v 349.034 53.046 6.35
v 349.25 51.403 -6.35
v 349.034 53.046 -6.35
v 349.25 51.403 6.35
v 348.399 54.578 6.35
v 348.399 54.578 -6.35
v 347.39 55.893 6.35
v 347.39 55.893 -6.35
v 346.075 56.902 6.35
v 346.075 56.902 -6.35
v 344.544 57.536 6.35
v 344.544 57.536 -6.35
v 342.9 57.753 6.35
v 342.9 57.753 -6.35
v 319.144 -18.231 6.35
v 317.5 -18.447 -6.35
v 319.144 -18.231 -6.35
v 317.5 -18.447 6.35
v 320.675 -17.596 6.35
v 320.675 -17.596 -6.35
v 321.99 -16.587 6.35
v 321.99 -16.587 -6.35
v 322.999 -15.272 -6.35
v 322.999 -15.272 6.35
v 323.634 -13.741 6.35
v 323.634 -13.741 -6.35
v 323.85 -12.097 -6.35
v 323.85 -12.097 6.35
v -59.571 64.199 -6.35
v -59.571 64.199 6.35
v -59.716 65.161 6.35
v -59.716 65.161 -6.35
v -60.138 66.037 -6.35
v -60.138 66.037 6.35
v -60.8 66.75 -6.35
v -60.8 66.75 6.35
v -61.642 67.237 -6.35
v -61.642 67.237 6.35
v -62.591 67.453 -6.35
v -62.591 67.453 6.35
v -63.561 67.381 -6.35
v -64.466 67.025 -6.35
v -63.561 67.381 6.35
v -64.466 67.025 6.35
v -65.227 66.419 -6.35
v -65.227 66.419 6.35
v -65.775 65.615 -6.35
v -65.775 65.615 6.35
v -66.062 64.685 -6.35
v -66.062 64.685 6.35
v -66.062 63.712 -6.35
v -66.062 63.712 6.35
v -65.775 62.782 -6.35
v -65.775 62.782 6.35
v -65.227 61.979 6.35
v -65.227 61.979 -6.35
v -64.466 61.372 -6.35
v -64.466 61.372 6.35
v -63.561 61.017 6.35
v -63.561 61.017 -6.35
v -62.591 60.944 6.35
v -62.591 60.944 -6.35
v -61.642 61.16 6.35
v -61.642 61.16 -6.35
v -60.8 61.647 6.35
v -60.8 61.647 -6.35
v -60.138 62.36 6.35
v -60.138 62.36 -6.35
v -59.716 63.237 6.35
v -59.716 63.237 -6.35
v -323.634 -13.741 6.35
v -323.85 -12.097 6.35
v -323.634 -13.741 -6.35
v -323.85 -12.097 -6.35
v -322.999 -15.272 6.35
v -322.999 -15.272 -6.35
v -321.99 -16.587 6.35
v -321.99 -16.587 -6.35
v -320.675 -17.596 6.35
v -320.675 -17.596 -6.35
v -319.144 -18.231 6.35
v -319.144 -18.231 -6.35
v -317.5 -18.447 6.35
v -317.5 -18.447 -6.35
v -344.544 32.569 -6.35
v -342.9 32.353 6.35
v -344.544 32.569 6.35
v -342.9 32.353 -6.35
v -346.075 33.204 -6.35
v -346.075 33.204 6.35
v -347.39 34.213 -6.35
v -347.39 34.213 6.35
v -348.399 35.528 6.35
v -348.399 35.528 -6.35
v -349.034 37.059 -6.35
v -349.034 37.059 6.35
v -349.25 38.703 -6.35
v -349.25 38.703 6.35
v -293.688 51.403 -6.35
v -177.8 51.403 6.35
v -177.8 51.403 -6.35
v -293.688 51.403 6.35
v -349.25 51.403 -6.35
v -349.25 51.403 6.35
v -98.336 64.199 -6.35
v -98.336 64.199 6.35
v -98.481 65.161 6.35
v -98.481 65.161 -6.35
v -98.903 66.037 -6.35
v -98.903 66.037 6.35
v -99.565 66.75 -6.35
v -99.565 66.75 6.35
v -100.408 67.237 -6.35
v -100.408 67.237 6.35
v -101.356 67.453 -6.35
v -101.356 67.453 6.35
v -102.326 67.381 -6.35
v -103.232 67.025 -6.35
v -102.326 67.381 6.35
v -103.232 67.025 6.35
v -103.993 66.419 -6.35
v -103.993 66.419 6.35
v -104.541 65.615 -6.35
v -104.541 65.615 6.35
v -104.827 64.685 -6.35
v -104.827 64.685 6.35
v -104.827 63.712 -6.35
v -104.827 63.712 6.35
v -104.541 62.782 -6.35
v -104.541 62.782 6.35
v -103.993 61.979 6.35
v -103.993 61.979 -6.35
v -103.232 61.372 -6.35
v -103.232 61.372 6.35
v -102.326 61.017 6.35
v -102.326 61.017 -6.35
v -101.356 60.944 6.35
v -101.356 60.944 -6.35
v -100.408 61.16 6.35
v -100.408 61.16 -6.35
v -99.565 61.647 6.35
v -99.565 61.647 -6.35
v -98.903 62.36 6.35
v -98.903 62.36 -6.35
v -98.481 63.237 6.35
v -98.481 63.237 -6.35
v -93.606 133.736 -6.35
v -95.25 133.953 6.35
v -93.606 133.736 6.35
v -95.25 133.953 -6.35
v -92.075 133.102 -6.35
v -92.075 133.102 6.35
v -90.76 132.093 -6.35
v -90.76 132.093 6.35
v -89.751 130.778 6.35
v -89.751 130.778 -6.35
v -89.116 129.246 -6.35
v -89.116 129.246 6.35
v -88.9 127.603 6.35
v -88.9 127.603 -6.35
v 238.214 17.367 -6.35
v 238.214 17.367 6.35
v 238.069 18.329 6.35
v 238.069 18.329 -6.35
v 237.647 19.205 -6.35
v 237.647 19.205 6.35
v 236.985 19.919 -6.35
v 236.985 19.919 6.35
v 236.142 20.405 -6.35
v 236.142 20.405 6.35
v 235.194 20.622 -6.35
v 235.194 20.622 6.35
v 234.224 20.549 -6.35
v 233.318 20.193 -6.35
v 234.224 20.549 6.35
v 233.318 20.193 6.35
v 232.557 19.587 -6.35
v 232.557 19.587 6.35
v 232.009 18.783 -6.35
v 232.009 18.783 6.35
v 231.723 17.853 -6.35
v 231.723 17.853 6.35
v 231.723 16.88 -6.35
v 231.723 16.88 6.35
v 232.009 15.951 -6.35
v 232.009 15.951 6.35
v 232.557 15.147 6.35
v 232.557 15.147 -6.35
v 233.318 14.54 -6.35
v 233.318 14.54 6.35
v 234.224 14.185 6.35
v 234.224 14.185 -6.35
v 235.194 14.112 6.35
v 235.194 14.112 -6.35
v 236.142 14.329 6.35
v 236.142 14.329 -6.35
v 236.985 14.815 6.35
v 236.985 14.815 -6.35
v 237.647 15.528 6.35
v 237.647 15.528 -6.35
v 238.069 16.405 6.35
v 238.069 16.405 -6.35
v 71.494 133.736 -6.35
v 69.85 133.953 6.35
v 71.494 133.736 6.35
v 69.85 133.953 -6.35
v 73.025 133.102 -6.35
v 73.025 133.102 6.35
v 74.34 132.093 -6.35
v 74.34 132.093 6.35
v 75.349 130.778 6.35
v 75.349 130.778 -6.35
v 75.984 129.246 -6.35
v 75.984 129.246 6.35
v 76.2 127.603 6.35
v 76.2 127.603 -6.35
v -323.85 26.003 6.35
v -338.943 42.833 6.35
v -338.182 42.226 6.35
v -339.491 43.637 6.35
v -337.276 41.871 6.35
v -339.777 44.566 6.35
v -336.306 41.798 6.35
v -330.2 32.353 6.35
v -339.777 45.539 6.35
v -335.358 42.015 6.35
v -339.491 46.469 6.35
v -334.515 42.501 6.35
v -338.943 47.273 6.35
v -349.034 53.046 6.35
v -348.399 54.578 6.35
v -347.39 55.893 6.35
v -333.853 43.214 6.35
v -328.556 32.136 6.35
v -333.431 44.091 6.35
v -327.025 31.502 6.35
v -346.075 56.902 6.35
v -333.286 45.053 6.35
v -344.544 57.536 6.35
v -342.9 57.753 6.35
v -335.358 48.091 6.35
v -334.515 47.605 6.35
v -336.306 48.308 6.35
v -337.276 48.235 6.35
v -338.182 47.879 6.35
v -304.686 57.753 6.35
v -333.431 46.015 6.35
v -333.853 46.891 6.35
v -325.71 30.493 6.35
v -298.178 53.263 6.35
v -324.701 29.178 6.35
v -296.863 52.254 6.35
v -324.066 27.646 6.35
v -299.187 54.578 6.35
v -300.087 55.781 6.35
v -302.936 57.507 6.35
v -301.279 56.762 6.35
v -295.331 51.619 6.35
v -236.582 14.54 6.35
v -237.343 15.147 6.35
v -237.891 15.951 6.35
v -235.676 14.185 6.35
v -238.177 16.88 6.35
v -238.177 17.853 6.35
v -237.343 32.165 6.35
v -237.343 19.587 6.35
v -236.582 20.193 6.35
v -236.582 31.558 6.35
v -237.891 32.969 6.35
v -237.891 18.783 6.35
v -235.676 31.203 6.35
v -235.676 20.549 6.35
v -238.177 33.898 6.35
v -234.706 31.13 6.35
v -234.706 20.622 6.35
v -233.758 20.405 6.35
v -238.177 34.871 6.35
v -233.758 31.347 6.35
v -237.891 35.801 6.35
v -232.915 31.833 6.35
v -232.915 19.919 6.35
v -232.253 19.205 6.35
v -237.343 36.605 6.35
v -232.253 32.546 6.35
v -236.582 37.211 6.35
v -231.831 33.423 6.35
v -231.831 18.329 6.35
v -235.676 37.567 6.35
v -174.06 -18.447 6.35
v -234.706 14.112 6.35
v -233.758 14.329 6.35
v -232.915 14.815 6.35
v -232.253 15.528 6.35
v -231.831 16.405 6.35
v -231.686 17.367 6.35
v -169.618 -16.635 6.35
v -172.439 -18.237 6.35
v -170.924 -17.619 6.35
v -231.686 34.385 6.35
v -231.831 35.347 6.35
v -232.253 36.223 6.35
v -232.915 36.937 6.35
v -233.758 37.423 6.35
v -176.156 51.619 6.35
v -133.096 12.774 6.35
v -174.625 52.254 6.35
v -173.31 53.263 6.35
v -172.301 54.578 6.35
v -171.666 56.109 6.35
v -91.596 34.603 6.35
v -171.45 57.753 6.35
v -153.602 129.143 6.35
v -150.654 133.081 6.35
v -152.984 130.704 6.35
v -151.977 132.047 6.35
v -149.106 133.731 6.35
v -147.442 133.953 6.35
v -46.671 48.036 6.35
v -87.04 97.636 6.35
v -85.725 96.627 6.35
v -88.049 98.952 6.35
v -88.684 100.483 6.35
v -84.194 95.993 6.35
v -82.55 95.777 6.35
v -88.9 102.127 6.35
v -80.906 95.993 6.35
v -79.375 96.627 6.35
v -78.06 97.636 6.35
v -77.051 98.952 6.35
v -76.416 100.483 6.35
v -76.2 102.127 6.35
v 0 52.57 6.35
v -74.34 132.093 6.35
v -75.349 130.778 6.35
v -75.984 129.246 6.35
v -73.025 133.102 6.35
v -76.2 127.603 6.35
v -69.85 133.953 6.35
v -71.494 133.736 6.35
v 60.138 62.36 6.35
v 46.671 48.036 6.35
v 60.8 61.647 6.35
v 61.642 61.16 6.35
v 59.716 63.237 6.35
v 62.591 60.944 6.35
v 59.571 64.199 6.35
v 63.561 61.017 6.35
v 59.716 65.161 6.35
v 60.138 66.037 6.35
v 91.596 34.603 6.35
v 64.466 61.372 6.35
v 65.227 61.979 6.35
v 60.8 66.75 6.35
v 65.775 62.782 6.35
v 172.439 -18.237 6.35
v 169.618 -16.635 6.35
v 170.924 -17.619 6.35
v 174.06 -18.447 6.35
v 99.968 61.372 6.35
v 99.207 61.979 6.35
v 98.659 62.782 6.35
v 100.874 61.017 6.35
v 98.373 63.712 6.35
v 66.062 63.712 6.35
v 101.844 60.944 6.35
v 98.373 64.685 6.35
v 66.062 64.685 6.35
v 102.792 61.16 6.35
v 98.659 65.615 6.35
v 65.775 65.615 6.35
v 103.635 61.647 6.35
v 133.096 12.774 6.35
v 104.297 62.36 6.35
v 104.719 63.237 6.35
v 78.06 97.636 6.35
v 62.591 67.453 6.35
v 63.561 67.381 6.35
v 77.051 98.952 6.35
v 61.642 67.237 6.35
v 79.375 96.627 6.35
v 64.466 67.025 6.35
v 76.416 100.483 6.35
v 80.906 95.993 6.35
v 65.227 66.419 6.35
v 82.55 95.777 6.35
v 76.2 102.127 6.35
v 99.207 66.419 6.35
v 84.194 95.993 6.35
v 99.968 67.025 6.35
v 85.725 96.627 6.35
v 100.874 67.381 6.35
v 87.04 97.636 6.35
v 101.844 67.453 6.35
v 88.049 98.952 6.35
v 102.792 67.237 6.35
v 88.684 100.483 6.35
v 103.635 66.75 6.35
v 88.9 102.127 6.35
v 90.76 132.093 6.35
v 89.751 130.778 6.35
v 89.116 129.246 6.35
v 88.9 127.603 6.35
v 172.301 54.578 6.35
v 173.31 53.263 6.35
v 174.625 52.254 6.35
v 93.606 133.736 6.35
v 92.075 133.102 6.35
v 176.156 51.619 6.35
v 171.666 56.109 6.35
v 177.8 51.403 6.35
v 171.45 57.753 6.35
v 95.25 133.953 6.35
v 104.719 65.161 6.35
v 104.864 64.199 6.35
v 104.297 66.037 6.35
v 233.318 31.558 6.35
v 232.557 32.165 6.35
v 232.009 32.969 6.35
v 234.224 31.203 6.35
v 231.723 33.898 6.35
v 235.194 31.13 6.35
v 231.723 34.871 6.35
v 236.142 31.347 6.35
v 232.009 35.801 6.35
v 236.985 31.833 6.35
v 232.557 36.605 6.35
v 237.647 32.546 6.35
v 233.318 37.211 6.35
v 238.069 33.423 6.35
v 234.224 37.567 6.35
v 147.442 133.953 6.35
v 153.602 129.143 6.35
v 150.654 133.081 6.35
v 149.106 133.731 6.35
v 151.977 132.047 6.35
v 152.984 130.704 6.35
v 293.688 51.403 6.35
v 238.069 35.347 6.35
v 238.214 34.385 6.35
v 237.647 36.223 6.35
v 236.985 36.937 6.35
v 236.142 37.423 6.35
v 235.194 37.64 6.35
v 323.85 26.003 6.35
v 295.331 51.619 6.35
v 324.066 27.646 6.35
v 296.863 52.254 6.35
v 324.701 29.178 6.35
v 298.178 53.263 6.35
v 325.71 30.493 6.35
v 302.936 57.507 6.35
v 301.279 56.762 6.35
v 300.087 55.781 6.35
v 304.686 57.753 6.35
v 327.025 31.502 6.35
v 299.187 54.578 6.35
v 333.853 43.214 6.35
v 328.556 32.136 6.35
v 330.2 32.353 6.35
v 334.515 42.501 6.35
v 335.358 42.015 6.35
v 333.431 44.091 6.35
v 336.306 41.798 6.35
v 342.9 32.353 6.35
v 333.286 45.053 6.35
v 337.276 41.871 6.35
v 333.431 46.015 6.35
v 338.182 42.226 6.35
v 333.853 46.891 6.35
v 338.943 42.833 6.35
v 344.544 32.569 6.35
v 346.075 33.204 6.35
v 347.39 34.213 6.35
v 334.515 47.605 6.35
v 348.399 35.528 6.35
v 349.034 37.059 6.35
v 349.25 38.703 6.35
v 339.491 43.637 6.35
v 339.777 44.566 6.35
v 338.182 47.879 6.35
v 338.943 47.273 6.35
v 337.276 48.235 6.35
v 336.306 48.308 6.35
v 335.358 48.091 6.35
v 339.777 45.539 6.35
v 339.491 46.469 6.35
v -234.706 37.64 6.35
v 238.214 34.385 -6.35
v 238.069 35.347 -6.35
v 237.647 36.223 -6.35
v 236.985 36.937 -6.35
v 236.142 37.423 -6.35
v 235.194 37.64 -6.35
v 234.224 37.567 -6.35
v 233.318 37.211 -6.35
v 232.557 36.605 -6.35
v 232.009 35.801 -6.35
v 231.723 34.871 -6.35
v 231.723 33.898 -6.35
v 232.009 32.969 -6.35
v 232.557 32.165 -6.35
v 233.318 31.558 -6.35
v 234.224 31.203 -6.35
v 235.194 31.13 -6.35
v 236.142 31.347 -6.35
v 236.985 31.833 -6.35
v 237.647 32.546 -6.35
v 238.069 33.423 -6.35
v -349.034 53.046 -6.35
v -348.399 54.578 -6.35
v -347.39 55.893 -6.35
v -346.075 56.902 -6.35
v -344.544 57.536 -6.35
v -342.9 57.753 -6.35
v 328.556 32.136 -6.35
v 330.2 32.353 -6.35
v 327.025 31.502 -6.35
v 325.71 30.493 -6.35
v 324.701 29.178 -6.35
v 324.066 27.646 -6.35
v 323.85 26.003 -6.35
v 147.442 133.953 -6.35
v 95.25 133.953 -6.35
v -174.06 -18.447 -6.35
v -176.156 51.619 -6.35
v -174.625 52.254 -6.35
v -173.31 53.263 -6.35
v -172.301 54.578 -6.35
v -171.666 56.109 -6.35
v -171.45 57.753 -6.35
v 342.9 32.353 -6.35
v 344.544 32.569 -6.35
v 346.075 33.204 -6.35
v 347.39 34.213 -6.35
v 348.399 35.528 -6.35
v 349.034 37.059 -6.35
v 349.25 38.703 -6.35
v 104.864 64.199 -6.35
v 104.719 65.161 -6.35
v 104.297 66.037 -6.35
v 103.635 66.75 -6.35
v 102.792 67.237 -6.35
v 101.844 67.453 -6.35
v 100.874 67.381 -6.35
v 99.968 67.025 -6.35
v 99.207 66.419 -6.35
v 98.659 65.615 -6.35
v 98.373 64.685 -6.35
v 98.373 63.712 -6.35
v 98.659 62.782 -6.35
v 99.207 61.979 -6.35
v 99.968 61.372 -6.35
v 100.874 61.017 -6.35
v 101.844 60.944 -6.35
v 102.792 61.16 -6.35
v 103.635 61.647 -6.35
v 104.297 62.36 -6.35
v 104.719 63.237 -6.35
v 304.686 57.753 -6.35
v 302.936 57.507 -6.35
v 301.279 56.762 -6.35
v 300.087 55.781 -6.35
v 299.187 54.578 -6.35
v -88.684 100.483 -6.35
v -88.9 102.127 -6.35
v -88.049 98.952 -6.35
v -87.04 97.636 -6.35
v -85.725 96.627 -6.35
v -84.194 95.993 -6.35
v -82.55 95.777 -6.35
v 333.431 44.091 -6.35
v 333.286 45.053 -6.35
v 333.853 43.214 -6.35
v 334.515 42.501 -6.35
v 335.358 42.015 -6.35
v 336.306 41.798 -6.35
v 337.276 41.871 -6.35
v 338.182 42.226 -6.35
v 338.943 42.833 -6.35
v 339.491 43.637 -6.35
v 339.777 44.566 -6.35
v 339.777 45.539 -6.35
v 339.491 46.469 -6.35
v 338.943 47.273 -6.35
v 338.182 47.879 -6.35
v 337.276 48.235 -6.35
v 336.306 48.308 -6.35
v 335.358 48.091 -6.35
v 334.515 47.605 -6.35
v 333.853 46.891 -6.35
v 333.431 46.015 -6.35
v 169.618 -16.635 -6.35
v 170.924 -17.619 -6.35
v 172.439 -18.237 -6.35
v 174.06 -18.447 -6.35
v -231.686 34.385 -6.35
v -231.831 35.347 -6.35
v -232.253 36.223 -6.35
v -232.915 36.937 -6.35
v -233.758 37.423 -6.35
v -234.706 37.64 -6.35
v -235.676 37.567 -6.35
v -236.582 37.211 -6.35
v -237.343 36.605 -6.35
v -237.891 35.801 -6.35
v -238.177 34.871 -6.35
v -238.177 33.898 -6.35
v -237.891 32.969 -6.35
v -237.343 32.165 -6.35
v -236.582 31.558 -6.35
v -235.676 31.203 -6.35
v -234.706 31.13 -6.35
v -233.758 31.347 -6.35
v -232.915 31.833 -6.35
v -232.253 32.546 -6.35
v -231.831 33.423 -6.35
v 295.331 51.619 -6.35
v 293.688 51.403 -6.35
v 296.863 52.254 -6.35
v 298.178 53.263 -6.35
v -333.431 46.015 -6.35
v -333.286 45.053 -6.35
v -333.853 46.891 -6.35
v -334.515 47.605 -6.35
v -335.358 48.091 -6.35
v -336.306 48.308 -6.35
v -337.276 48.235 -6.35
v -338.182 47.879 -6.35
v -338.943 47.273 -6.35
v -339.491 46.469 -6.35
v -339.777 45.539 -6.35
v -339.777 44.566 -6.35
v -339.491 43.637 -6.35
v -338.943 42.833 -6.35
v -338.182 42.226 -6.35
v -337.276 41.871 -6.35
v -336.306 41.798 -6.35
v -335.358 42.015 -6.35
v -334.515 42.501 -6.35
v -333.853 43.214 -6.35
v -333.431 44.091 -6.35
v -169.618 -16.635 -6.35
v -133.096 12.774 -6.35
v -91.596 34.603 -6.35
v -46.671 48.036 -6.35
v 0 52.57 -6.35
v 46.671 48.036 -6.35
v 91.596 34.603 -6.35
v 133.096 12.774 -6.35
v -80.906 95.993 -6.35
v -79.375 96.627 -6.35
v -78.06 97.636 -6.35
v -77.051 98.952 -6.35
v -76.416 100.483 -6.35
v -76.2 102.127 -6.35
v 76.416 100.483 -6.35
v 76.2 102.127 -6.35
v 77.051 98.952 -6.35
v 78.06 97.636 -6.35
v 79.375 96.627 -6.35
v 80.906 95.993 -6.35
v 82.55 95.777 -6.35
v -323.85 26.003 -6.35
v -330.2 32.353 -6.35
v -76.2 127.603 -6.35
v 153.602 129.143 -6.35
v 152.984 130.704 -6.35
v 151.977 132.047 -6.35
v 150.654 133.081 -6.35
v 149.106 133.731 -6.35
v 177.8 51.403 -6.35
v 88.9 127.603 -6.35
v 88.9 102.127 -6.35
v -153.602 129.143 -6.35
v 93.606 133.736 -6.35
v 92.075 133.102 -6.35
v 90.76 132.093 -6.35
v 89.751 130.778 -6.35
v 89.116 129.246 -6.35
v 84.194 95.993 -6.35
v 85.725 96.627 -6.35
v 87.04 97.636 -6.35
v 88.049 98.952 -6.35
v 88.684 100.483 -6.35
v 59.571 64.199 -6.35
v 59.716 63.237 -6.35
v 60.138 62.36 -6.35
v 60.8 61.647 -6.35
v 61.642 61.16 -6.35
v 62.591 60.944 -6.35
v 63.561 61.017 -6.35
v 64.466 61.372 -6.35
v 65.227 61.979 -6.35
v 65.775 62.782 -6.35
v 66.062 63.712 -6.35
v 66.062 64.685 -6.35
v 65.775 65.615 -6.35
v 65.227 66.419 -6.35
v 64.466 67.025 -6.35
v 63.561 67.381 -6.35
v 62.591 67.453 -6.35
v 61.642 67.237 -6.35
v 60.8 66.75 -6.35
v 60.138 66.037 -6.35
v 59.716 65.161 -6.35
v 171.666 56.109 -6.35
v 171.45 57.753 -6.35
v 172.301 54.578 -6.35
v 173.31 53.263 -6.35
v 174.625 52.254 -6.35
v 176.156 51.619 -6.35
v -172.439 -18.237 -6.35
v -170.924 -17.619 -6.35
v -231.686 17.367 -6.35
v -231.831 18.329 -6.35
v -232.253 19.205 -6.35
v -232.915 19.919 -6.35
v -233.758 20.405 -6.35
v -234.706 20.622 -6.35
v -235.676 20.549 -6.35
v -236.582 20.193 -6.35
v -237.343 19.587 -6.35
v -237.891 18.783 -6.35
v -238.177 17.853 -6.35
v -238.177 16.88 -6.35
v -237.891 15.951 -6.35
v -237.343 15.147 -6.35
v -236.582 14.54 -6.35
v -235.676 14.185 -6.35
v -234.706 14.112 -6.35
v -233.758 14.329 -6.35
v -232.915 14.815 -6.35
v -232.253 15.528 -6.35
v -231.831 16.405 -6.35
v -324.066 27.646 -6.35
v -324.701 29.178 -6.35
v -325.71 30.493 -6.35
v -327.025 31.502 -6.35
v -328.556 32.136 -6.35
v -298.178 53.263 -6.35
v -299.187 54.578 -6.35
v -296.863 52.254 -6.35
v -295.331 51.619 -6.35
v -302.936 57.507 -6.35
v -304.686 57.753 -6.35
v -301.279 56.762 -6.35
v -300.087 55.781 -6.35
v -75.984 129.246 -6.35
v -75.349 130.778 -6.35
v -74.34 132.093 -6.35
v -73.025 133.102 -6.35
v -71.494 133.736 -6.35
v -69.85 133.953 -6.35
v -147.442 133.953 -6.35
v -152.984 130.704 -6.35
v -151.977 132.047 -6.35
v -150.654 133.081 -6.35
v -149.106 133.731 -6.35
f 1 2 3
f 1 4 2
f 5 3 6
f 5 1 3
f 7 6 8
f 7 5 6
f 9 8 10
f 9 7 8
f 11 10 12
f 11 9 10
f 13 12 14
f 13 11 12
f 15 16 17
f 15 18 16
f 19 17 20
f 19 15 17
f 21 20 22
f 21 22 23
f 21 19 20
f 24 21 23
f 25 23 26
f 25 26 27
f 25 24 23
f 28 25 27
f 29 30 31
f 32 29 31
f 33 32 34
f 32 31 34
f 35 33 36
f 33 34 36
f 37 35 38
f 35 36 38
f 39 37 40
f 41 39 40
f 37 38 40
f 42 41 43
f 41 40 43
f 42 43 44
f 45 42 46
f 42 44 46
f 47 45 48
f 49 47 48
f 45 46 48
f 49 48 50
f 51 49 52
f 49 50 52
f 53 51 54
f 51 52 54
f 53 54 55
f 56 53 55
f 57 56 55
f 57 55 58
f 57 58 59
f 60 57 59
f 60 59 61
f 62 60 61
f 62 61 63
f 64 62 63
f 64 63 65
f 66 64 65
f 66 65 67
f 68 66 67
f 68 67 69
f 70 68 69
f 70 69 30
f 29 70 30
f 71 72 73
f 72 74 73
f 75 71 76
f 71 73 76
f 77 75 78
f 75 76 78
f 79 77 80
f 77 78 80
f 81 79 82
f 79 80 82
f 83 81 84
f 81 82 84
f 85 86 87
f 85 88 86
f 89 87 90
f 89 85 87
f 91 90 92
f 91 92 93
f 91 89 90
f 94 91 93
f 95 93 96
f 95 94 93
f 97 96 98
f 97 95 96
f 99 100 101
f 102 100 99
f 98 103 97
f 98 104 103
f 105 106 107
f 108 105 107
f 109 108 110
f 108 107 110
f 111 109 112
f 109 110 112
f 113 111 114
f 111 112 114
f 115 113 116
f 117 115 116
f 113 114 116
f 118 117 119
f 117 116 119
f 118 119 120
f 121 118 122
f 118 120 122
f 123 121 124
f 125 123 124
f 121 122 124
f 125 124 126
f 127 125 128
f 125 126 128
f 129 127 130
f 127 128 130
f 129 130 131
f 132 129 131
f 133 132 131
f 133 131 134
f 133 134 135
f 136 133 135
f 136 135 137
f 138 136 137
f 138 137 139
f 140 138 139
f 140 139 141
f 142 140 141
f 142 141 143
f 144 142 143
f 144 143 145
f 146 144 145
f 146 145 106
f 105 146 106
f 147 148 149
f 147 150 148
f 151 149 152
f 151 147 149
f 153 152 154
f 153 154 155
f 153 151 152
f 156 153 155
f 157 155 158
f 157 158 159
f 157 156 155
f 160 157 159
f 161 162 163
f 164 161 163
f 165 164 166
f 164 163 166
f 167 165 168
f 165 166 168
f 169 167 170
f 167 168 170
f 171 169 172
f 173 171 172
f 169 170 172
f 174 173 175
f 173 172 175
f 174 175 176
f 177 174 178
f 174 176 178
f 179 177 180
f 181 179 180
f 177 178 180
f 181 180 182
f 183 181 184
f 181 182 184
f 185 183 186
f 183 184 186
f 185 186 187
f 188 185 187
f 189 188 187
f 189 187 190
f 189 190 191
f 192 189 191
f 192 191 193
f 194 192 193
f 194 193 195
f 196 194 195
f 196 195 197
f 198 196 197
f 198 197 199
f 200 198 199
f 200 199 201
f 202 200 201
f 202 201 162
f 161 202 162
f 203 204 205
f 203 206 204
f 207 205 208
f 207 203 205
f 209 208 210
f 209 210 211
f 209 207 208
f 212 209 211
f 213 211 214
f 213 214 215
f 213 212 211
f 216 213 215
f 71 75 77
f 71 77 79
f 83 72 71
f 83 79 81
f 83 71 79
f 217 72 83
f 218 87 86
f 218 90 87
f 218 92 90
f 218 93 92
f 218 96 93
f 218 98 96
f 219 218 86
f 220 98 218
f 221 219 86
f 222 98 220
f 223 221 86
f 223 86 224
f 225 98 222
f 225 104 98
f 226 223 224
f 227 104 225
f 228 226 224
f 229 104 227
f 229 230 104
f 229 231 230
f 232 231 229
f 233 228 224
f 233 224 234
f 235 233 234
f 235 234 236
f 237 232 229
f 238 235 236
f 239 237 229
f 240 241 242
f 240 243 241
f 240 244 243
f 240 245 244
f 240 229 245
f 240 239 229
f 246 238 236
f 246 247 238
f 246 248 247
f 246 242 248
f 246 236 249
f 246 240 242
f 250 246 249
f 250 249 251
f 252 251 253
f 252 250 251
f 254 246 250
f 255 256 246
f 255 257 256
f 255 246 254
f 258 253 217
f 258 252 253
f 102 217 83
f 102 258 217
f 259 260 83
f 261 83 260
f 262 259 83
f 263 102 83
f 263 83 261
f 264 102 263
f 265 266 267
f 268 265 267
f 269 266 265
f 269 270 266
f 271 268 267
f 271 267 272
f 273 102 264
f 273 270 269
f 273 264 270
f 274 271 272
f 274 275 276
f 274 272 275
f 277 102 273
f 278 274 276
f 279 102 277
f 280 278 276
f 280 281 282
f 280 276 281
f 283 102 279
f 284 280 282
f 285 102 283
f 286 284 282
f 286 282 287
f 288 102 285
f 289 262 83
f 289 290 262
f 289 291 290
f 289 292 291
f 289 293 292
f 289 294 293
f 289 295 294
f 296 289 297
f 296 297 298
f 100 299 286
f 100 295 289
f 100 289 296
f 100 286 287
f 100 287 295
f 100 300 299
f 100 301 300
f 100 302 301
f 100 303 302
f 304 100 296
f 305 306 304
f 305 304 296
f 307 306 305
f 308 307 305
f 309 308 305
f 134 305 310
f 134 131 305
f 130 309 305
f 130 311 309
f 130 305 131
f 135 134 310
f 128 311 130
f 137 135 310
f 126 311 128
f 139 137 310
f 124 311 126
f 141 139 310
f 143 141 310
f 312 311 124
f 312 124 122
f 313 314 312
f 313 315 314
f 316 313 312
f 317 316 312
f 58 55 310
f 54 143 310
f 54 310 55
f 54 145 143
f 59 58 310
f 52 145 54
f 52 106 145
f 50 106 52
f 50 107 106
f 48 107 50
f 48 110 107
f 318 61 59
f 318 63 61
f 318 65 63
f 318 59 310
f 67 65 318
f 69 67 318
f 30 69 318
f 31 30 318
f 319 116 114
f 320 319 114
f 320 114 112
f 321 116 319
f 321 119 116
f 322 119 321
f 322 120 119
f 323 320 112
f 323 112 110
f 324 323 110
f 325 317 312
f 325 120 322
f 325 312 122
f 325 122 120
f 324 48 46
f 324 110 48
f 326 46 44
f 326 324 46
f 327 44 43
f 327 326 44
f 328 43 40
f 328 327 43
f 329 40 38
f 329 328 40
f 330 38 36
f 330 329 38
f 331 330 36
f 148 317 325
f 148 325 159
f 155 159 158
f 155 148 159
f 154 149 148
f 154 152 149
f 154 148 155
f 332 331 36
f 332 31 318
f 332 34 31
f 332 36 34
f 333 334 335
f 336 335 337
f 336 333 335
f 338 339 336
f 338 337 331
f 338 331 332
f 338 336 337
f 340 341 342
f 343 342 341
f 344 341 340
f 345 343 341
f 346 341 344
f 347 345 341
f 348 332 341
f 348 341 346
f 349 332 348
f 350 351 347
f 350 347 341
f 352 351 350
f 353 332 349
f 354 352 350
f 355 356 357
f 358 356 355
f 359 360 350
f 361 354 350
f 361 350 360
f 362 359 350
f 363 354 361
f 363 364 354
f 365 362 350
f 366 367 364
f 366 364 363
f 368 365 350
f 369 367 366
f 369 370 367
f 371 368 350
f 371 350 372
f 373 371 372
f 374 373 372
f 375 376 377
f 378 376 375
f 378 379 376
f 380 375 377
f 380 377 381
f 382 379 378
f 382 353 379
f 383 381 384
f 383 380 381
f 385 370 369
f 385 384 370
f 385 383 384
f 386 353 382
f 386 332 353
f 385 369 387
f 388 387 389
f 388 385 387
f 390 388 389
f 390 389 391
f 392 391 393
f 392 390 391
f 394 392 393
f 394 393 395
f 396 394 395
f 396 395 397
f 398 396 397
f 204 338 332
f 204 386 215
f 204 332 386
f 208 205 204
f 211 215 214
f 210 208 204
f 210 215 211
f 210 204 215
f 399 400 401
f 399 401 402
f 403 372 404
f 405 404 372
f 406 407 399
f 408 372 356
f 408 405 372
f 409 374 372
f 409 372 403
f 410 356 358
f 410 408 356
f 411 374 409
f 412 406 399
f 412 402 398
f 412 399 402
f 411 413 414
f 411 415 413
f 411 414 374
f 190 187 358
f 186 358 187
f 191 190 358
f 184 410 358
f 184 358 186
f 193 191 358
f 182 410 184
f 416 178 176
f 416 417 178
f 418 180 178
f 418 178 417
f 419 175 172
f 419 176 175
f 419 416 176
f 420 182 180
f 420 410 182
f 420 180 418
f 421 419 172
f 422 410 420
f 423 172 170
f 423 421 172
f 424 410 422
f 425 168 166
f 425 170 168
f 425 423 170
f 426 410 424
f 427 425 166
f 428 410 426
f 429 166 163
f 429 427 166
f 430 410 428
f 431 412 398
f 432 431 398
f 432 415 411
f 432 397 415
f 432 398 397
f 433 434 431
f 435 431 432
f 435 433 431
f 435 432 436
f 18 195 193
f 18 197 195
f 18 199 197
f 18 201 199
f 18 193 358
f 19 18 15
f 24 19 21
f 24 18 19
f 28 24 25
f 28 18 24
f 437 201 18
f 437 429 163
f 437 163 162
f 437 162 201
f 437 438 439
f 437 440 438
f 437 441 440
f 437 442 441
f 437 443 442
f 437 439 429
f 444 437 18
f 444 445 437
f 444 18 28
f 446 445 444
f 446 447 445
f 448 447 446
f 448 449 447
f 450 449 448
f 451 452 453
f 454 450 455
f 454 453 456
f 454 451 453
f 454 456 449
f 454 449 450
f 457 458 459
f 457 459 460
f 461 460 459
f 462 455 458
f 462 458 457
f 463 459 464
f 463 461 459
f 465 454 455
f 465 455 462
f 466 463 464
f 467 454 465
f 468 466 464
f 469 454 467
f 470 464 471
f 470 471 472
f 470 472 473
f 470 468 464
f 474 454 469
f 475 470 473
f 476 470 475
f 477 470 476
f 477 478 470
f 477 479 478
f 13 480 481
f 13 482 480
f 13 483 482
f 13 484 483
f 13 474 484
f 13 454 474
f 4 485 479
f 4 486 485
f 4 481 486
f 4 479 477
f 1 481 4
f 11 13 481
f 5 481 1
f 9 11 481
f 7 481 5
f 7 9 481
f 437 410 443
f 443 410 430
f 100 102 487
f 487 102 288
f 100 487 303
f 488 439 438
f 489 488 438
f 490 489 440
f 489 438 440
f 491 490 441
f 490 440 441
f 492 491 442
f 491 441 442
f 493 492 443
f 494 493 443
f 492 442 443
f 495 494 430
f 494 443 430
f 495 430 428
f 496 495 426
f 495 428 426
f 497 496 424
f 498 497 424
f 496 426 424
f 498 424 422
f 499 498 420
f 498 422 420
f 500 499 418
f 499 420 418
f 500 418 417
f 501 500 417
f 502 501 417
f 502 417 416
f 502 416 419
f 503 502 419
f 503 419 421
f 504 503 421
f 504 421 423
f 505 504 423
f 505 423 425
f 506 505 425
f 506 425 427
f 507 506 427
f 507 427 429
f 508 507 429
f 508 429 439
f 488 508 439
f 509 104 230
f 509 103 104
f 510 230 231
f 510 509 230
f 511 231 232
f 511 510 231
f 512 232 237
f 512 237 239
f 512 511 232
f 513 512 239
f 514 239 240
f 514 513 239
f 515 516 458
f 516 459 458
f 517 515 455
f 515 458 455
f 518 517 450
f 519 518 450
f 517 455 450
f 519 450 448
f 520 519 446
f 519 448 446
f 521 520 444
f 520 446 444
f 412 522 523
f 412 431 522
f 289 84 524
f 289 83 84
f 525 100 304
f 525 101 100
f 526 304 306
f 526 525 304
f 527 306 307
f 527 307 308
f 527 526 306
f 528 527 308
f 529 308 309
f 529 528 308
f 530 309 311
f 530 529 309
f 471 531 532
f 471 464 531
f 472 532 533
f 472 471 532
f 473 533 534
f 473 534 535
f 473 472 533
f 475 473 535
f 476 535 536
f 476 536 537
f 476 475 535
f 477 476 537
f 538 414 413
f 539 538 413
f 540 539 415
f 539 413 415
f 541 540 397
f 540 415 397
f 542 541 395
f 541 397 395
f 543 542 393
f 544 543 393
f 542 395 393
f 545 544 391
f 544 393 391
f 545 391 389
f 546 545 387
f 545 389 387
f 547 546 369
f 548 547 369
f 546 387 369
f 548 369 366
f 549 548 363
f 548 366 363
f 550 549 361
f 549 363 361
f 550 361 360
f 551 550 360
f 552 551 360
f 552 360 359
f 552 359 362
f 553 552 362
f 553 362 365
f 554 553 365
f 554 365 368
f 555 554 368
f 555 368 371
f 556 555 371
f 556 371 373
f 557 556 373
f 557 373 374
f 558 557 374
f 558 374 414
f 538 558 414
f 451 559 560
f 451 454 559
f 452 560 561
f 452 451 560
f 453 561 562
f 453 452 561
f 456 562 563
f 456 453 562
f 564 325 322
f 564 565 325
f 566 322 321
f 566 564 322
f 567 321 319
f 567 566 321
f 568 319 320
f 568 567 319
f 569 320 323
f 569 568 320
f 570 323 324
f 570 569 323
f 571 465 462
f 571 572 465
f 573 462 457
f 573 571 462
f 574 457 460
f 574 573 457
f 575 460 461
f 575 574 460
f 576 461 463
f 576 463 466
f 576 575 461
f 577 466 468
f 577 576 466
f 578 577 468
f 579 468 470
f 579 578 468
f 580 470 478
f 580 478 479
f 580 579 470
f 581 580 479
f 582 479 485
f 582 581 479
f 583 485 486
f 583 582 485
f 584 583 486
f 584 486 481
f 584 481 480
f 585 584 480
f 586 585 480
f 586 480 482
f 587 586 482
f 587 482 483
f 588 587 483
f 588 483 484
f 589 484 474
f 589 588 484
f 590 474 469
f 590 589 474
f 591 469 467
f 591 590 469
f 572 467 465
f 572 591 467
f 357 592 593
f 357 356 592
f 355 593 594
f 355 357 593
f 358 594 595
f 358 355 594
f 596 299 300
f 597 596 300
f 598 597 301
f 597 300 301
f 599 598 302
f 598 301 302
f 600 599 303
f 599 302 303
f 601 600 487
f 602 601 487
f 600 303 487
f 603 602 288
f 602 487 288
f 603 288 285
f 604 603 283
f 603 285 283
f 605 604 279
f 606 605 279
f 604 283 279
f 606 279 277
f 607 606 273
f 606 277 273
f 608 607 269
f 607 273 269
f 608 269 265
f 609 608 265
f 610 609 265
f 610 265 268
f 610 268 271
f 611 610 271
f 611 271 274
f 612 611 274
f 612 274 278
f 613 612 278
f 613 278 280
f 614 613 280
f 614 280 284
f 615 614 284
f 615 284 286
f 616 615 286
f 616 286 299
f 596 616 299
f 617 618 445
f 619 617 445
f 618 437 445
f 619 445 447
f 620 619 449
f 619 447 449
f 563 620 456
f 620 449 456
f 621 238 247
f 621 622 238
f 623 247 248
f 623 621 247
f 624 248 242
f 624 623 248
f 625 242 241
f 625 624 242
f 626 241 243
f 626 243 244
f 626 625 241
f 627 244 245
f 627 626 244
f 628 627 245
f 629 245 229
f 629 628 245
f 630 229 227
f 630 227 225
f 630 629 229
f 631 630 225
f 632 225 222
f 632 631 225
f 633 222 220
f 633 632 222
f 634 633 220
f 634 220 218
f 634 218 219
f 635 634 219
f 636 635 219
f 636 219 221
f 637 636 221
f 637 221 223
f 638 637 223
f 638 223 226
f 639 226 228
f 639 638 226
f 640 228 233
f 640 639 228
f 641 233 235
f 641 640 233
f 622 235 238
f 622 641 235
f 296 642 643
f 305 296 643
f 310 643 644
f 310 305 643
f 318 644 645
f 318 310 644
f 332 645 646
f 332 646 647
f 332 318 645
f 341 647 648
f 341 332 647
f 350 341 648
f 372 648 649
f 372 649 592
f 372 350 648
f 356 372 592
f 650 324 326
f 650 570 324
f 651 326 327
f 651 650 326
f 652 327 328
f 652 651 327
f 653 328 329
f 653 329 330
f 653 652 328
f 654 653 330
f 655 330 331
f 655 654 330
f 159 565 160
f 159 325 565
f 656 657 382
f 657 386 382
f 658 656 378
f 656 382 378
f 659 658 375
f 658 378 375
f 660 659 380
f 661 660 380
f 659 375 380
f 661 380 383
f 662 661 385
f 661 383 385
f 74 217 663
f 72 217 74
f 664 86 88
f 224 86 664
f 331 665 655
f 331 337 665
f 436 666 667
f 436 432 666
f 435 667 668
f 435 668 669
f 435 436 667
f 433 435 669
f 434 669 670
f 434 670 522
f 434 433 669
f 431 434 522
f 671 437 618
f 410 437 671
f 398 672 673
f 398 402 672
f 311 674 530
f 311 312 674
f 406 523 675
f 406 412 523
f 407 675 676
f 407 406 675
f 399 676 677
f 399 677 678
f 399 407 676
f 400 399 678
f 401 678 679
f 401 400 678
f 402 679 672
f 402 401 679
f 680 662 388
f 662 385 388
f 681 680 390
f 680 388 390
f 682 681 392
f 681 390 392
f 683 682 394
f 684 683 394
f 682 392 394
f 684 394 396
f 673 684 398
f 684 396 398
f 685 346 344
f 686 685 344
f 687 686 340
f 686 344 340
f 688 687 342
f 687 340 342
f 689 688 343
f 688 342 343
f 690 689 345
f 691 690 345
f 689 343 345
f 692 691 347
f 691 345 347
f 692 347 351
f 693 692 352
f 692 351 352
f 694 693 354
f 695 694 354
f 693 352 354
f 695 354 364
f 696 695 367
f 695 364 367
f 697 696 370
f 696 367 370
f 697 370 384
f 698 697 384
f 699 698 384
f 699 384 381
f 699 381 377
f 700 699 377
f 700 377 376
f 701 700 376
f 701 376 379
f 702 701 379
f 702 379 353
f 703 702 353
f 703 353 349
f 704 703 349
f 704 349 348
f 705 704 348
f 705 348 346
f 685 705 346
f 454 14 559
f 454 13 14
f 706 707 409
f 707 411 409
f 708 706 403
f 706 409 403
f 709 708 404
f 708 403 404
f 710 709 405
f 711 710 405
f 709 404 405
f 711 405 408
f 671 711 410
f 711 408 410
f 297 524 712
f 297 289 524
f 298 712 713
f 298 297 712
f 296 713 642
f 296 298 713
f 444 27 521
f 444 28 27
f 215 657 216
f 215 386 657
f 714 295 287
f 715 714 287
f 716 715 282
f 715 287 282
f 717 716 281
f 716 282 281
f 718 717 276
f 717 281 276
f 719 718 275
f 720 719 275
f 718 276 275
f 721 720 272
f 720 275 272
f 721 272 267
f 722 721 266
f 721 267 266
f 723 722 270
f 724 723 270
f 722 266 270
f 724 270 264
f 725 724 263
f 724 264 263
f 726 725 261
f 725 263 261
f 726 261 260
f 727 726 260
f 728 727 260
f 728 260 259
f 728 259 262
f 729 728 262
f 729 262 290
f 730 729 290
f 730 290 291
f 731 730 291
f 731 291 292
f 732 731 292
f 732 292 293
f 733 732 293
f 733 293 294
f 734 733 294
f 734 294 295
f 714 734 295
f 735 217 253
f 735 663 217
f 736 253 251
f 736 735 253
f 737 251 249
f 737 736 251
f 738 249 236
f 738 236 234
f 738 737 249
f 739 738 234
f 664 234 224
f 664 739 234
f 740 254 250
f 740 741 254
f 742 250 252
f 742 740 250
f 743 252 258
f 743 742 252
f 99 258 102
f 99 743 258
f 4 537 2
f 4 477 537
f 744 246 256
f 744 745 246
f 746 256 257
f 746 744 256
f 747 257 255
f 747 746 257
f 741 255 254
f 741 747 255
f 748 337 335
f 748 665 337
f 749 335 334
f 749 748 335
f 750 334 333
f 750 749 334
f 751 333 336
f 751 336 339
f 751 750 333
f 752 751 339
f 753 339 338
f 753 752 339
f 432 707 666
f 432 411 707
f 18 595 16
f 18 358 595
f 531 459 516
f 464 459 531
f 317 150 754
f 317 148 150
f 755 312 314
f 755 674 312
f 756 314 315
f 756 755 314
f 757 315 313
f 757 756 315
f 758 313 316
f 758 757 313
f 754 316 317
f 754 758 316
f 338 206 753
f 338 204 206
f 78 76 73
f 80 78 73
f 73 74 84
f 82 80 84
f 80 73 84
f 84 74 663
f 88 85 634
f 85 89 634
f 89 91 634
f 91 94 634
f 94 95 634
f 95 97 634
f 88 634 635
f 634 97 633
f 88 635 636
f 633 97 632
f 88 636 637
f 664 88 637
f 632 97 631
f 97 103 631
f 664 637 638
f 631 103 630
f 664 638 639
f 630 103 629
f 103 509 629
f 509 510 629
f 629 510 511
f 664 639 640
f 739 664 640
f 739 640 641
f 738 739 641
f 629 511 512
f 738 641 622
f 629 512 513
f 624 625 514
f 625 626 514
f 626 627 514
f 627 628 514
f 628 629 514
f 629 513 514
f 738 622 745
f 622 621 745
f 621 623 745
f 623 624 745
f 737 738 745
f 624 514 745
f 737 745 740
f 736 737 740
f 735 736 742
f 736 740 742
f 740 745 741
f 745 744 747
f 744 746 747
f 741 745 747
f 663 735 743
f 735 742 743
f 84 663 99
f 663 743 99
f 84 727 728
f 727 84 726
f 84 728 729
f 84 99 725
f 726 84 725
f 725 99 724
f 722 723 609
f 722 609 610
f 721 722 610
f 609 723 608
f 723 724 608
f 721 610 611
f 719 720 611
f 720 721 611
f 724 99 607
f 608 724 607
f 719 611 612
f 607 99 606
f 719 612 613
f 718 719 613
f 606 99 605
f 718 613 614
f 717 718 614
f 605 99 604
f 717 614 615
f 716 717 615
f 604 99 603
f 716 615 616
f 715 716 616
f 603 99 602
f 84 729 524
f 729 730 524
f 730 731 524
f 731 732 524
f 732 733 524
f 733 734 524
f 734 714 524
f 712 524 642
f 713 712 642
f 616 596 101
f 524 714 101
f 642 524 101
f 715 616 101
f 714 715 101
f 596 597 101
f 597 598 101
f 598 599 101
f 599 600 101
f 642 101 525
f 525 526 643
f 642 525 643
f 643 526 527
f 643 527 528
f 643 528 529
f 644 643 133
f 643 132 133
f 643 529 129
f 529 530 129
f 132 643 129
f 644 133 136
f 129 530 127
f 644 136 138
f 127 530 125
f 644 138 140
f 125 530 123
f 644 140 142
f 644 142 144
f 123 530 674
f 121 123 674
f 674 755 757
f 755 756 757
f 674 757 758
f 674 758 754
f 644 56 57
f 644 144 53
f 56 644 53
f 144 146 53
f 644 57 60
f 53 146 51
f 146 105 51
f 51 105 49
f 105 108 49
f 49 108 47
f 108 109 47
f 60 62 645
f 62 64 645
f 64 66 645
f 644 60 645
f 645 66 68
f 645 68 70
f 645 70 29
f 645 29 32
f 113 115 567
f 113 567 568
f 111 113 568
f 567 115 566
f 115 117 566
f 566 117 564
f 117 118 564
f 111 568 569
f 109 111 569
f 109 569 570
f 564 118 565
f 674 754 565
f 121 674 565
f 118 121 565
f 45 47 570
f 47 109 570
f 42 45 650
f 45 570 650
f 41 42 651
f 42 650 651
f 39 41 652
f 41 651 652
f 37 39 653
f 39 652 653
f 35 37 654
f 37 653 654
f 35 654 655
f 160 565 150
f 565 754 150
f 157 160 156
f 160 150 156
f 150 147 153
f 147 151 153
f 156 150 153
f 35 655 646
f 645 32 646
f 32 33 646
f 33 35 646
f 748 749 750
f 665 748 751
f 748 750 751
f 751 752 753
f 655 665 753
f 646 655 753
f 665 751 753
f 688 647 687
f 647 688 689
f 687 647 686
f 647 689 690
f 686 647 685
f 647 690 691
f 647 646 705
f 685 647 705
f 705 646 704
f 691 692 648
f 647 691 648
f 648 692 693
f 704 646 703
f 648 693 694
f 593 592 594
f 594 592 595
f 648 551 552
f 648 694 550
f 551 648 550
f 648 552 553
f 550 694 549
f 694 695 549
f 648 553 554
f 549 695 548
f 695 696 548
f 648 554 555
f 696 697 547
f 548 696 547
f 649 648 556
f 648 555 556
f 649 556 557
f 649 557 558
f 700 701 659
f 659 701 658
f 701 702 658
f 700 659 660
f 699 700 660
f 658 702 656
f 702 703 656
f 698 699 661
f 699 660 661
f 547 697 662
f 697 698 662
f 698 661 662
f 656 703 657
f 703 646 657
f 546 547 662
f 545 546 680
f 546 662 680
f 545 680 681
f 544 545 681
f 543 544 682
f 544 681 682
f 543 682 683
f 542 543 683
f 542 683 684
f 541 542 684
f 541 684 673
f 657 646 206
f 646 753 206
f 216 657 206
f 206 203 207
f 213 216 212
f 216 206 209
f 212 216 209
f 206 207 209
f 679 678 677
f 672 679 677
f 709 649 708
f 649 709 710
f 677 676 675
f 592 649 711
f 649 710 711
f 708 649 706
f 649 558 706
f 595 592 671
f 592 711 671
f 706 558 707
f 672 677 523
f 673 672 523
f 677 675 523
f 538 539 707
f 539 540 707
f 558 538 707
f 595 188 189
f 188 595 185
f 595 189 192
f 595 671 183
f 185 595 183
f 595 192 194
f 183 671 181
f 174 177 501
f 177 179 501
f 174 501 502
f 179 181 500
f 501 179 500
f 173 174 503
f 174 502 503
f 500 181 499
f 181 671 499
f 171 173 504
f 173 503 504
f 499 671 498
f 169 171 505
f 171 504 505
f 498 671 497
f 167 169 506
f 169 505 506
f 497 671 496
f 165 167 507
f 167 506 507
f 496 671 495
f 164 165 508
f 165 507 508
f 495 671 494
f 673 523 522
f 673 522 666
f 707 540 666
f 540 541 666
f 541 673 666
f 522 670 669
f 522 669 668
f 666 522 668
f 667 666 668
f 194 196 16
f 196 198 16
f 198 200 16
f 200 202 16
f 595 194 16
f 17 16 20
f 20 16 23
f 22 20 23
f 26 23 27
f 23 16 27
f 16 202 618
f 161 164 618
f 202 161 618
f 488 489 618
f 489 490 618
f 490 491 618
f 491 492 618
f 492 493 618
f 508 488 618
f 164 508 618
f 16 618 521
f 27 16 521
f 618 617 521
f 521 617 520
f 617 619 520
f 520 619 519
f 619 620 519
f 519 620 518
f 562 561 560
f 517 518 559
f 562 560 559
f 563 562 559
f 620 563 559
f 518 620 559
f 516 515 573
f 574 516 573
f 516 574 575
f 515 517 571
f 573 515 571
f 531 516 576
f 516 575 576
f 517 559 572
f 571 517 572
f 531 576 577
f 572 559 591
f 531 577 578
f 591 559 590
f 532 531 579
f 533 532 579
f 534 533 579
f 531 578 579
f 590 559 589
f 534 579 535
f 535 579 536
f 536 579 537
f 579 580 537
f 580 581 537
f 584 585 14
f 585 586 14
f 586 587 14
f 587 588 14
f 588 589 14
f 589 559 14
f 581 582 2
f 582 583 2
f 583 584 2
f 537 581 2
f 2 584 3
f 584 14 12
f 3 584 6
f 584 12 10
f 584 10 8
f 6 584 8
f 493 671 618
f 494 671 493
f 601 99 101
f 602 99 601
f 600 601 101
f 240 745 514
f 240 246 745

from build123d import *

# Parameters (mm, degrees)
SKETCH1_R           = 3.2639
BOSS_EXTRUDE1_DEPTH = 6.35
FILLET1_R           = 6.35
SKETCH2_R           = 3.2639
CUT_EXTRUDE2_DEPTH  = 375.272921719
SKETCH3_R           = 3.2639
CUT_EXTRUDE3_DEPTH  = 375.272921719
FILLET2_R           = 6.35


with BuildPart() as part:
    # Sketch1 → Boss-Extrude1 (new, symmetric)
    with BuildSketch(Plane.XY):
        with BuildLine():
            Line((-323.85, -18.447144741), (-171.45, -18.447144741))
            ThreePointArc((-171.45, -18.447144741), (0, 52.569770528), (171.45, -18.447144741))
            Line((171.45, -18.447144741), (323.85, -18.447144741))
            Line((323.85, -18.447144741), (323.85, 32.352855259))
            Line((323.85, 32.352855259), (349.25, 32.352855259))
            Line((349.25, 32.352855259), (349.25, 57.752855259))
            Line((349.25, 57.752855259), (300.0375, 57.752855259))
            Line((300.0375, 57.752855259), (300.0375, 51.402855259))
            Line((300.0375, 51.402855259), (171.45, 51.402855259))
            Line((171.45, 51.402855259), (171.45, 57.752855259))
            Line((171.45, 57.752855259), (152.4, 133.952855259))
            Line((152.4, 133.952855259), (88.9, 133.952855259))
            Line((88.9, 133.952855259), (88.9, 95.776655259))
            Line((88.9, 95.776655259), (76.2, 95.776655259))
            Line((76.2, 95.776655259), (76.2, 133.952855259))
            Line((76.2, 133.952855259), (-76.2, 133.952855259))
            Line((-76.2, 133.952855259), (-76.2, 95.776655259))
            Line((-76.2, 95.776655259), (-88.9, 95.776655259))
            Line((-88.9, 95.776655259), (-88.9, 133.952855259))
            Line((-88.9, 133.952855259), (-152.4, 133.952855259))
            Line((-152.4, 133.952855259), (-171.45, 57.752855259))
            Line((-171.45, 57.752855259), (-171.45, 51.402855259))
            Line((-171.45, 51.402855259), (-300.0375, 51.402855259))
            Line((-300.0375, 51.402855259), (-300.0375, 57.752855259))
            Line((-300.0375, 57.752855259), (-349.25, 57.752855259))
            Line((-349.25, 57.752855259), (-349.25, 32.352855259))
            Line((-349.25, 32.352855259), (-323.85, 32.352855259))
            Line((-323.85, 32.352855259), (-323.85, -18.447144741))
        make_face()
        with Locations((-336.55, 45.052855259)):
            Circle(SKETCH1_R, mode=Mode.SUBTRACT)
        with Locations(Location((336.55, 45.052855259, 0), (0, 0, 180))):
            Circle(SKETCH1_R, mode=Mode.SUBTRACT)
    extrude(amount=BOSS_EXTRUDE1_DEPTH, both=True)

    # Fillet1
    fillet1_edges = [part.edges().sort_by_distance(p)[0] for p in [
        (88.9, 95.776655259, 0),
        (76.2, 95.776655259, 0),
        (-88.9, 95.776655259, 0),
        (-76.2, 95.776655259, 0),
        (323.85, 32.352855259, 0),
        (171.45, 51.402855259, 0),
        (300.0375, 51.402855259, 0),
        (-171.45, 51.402855259, 0),
        (-300.0375, 51.402855259, 0),
        (-323.85, 32.352855259, 0),
    ]]
    fillet(fillet1_edges, radius=FILLET1_R - 0.0001)  # a hair under: the kernel refuses the full size

    # Sketch2 → Cut-Extrude2 (cut, through all)
    with BuildSketch(Plane.XY.offset(6.35)):
        with Locations((-234.95, 17.366855259)):
            Circle(SKETCH2_R)
        with Locations((-234.95, 34.384855259)):
            Circle(SKETCH2_R)
        with Locations((234.95, 34.384855259)):
            Circle(SKETCH2_R)
        with Locations((234.95, 17.366855259)):
            Circle(SKETCH2_R)
    extrude(amount=-CUT_EXTRUDE2_DEPTH, mode=Mode.SUBTRACT)

    # Sketch3 → Cut-Extrude3 (cut, through all)
    with BuildSketch(Plane.XY.offset(6.35)):
        with Locations((-101.6, 64.198647102)):
            Circle(SKETCH3_R)
        with Locations((101.6, 64.198647102)):
            Circle(SKETCH3_R)
        with Locations((-62.834515607, 64.198647102)):
            Circle(SKETCH3_R)
        with Locations(Location((62.834515607, 64.198647102, 0), (0, 0, 180))):
            Circle(SKETCH3_R)
    extrude(amount=-CUT_EXTRUDE3_DEPTH, mode=Mode.SUBTRACT)

    # Fillet2
    fillet2_edges = [part.edges().sort_by_distance(p)[0] for p in [
        (-152.4, 133.952855259, 0),
        (-88.9, 133.952855259, 0),
        (-76.2, 133.952855259, 0),
        (76.2, 133.952855259, 0),
        (88.9, 133.952855259, 0),
        (152.4, 133.952855259, 0),
        (300.0375, 57.752855259, 0),
        (349.25, 57.752855259, 0),
        (349.25, 32.352855259, 0),
        (323.85, -18.447144741, 0),
        (171.45, -18.447144741, 0),
        (-171.45, -18.447144741, 0),
        (-323.85, -18.447144741, 0),
        (-349.25, 32.352855259, 0),
        (-349.25, 57.752855259, 0),
        (-300.0375, 57.752855259, 0),
    ]]
    fillet(fillet2_edges, radius=FILLET2_R)


solid = part.part
